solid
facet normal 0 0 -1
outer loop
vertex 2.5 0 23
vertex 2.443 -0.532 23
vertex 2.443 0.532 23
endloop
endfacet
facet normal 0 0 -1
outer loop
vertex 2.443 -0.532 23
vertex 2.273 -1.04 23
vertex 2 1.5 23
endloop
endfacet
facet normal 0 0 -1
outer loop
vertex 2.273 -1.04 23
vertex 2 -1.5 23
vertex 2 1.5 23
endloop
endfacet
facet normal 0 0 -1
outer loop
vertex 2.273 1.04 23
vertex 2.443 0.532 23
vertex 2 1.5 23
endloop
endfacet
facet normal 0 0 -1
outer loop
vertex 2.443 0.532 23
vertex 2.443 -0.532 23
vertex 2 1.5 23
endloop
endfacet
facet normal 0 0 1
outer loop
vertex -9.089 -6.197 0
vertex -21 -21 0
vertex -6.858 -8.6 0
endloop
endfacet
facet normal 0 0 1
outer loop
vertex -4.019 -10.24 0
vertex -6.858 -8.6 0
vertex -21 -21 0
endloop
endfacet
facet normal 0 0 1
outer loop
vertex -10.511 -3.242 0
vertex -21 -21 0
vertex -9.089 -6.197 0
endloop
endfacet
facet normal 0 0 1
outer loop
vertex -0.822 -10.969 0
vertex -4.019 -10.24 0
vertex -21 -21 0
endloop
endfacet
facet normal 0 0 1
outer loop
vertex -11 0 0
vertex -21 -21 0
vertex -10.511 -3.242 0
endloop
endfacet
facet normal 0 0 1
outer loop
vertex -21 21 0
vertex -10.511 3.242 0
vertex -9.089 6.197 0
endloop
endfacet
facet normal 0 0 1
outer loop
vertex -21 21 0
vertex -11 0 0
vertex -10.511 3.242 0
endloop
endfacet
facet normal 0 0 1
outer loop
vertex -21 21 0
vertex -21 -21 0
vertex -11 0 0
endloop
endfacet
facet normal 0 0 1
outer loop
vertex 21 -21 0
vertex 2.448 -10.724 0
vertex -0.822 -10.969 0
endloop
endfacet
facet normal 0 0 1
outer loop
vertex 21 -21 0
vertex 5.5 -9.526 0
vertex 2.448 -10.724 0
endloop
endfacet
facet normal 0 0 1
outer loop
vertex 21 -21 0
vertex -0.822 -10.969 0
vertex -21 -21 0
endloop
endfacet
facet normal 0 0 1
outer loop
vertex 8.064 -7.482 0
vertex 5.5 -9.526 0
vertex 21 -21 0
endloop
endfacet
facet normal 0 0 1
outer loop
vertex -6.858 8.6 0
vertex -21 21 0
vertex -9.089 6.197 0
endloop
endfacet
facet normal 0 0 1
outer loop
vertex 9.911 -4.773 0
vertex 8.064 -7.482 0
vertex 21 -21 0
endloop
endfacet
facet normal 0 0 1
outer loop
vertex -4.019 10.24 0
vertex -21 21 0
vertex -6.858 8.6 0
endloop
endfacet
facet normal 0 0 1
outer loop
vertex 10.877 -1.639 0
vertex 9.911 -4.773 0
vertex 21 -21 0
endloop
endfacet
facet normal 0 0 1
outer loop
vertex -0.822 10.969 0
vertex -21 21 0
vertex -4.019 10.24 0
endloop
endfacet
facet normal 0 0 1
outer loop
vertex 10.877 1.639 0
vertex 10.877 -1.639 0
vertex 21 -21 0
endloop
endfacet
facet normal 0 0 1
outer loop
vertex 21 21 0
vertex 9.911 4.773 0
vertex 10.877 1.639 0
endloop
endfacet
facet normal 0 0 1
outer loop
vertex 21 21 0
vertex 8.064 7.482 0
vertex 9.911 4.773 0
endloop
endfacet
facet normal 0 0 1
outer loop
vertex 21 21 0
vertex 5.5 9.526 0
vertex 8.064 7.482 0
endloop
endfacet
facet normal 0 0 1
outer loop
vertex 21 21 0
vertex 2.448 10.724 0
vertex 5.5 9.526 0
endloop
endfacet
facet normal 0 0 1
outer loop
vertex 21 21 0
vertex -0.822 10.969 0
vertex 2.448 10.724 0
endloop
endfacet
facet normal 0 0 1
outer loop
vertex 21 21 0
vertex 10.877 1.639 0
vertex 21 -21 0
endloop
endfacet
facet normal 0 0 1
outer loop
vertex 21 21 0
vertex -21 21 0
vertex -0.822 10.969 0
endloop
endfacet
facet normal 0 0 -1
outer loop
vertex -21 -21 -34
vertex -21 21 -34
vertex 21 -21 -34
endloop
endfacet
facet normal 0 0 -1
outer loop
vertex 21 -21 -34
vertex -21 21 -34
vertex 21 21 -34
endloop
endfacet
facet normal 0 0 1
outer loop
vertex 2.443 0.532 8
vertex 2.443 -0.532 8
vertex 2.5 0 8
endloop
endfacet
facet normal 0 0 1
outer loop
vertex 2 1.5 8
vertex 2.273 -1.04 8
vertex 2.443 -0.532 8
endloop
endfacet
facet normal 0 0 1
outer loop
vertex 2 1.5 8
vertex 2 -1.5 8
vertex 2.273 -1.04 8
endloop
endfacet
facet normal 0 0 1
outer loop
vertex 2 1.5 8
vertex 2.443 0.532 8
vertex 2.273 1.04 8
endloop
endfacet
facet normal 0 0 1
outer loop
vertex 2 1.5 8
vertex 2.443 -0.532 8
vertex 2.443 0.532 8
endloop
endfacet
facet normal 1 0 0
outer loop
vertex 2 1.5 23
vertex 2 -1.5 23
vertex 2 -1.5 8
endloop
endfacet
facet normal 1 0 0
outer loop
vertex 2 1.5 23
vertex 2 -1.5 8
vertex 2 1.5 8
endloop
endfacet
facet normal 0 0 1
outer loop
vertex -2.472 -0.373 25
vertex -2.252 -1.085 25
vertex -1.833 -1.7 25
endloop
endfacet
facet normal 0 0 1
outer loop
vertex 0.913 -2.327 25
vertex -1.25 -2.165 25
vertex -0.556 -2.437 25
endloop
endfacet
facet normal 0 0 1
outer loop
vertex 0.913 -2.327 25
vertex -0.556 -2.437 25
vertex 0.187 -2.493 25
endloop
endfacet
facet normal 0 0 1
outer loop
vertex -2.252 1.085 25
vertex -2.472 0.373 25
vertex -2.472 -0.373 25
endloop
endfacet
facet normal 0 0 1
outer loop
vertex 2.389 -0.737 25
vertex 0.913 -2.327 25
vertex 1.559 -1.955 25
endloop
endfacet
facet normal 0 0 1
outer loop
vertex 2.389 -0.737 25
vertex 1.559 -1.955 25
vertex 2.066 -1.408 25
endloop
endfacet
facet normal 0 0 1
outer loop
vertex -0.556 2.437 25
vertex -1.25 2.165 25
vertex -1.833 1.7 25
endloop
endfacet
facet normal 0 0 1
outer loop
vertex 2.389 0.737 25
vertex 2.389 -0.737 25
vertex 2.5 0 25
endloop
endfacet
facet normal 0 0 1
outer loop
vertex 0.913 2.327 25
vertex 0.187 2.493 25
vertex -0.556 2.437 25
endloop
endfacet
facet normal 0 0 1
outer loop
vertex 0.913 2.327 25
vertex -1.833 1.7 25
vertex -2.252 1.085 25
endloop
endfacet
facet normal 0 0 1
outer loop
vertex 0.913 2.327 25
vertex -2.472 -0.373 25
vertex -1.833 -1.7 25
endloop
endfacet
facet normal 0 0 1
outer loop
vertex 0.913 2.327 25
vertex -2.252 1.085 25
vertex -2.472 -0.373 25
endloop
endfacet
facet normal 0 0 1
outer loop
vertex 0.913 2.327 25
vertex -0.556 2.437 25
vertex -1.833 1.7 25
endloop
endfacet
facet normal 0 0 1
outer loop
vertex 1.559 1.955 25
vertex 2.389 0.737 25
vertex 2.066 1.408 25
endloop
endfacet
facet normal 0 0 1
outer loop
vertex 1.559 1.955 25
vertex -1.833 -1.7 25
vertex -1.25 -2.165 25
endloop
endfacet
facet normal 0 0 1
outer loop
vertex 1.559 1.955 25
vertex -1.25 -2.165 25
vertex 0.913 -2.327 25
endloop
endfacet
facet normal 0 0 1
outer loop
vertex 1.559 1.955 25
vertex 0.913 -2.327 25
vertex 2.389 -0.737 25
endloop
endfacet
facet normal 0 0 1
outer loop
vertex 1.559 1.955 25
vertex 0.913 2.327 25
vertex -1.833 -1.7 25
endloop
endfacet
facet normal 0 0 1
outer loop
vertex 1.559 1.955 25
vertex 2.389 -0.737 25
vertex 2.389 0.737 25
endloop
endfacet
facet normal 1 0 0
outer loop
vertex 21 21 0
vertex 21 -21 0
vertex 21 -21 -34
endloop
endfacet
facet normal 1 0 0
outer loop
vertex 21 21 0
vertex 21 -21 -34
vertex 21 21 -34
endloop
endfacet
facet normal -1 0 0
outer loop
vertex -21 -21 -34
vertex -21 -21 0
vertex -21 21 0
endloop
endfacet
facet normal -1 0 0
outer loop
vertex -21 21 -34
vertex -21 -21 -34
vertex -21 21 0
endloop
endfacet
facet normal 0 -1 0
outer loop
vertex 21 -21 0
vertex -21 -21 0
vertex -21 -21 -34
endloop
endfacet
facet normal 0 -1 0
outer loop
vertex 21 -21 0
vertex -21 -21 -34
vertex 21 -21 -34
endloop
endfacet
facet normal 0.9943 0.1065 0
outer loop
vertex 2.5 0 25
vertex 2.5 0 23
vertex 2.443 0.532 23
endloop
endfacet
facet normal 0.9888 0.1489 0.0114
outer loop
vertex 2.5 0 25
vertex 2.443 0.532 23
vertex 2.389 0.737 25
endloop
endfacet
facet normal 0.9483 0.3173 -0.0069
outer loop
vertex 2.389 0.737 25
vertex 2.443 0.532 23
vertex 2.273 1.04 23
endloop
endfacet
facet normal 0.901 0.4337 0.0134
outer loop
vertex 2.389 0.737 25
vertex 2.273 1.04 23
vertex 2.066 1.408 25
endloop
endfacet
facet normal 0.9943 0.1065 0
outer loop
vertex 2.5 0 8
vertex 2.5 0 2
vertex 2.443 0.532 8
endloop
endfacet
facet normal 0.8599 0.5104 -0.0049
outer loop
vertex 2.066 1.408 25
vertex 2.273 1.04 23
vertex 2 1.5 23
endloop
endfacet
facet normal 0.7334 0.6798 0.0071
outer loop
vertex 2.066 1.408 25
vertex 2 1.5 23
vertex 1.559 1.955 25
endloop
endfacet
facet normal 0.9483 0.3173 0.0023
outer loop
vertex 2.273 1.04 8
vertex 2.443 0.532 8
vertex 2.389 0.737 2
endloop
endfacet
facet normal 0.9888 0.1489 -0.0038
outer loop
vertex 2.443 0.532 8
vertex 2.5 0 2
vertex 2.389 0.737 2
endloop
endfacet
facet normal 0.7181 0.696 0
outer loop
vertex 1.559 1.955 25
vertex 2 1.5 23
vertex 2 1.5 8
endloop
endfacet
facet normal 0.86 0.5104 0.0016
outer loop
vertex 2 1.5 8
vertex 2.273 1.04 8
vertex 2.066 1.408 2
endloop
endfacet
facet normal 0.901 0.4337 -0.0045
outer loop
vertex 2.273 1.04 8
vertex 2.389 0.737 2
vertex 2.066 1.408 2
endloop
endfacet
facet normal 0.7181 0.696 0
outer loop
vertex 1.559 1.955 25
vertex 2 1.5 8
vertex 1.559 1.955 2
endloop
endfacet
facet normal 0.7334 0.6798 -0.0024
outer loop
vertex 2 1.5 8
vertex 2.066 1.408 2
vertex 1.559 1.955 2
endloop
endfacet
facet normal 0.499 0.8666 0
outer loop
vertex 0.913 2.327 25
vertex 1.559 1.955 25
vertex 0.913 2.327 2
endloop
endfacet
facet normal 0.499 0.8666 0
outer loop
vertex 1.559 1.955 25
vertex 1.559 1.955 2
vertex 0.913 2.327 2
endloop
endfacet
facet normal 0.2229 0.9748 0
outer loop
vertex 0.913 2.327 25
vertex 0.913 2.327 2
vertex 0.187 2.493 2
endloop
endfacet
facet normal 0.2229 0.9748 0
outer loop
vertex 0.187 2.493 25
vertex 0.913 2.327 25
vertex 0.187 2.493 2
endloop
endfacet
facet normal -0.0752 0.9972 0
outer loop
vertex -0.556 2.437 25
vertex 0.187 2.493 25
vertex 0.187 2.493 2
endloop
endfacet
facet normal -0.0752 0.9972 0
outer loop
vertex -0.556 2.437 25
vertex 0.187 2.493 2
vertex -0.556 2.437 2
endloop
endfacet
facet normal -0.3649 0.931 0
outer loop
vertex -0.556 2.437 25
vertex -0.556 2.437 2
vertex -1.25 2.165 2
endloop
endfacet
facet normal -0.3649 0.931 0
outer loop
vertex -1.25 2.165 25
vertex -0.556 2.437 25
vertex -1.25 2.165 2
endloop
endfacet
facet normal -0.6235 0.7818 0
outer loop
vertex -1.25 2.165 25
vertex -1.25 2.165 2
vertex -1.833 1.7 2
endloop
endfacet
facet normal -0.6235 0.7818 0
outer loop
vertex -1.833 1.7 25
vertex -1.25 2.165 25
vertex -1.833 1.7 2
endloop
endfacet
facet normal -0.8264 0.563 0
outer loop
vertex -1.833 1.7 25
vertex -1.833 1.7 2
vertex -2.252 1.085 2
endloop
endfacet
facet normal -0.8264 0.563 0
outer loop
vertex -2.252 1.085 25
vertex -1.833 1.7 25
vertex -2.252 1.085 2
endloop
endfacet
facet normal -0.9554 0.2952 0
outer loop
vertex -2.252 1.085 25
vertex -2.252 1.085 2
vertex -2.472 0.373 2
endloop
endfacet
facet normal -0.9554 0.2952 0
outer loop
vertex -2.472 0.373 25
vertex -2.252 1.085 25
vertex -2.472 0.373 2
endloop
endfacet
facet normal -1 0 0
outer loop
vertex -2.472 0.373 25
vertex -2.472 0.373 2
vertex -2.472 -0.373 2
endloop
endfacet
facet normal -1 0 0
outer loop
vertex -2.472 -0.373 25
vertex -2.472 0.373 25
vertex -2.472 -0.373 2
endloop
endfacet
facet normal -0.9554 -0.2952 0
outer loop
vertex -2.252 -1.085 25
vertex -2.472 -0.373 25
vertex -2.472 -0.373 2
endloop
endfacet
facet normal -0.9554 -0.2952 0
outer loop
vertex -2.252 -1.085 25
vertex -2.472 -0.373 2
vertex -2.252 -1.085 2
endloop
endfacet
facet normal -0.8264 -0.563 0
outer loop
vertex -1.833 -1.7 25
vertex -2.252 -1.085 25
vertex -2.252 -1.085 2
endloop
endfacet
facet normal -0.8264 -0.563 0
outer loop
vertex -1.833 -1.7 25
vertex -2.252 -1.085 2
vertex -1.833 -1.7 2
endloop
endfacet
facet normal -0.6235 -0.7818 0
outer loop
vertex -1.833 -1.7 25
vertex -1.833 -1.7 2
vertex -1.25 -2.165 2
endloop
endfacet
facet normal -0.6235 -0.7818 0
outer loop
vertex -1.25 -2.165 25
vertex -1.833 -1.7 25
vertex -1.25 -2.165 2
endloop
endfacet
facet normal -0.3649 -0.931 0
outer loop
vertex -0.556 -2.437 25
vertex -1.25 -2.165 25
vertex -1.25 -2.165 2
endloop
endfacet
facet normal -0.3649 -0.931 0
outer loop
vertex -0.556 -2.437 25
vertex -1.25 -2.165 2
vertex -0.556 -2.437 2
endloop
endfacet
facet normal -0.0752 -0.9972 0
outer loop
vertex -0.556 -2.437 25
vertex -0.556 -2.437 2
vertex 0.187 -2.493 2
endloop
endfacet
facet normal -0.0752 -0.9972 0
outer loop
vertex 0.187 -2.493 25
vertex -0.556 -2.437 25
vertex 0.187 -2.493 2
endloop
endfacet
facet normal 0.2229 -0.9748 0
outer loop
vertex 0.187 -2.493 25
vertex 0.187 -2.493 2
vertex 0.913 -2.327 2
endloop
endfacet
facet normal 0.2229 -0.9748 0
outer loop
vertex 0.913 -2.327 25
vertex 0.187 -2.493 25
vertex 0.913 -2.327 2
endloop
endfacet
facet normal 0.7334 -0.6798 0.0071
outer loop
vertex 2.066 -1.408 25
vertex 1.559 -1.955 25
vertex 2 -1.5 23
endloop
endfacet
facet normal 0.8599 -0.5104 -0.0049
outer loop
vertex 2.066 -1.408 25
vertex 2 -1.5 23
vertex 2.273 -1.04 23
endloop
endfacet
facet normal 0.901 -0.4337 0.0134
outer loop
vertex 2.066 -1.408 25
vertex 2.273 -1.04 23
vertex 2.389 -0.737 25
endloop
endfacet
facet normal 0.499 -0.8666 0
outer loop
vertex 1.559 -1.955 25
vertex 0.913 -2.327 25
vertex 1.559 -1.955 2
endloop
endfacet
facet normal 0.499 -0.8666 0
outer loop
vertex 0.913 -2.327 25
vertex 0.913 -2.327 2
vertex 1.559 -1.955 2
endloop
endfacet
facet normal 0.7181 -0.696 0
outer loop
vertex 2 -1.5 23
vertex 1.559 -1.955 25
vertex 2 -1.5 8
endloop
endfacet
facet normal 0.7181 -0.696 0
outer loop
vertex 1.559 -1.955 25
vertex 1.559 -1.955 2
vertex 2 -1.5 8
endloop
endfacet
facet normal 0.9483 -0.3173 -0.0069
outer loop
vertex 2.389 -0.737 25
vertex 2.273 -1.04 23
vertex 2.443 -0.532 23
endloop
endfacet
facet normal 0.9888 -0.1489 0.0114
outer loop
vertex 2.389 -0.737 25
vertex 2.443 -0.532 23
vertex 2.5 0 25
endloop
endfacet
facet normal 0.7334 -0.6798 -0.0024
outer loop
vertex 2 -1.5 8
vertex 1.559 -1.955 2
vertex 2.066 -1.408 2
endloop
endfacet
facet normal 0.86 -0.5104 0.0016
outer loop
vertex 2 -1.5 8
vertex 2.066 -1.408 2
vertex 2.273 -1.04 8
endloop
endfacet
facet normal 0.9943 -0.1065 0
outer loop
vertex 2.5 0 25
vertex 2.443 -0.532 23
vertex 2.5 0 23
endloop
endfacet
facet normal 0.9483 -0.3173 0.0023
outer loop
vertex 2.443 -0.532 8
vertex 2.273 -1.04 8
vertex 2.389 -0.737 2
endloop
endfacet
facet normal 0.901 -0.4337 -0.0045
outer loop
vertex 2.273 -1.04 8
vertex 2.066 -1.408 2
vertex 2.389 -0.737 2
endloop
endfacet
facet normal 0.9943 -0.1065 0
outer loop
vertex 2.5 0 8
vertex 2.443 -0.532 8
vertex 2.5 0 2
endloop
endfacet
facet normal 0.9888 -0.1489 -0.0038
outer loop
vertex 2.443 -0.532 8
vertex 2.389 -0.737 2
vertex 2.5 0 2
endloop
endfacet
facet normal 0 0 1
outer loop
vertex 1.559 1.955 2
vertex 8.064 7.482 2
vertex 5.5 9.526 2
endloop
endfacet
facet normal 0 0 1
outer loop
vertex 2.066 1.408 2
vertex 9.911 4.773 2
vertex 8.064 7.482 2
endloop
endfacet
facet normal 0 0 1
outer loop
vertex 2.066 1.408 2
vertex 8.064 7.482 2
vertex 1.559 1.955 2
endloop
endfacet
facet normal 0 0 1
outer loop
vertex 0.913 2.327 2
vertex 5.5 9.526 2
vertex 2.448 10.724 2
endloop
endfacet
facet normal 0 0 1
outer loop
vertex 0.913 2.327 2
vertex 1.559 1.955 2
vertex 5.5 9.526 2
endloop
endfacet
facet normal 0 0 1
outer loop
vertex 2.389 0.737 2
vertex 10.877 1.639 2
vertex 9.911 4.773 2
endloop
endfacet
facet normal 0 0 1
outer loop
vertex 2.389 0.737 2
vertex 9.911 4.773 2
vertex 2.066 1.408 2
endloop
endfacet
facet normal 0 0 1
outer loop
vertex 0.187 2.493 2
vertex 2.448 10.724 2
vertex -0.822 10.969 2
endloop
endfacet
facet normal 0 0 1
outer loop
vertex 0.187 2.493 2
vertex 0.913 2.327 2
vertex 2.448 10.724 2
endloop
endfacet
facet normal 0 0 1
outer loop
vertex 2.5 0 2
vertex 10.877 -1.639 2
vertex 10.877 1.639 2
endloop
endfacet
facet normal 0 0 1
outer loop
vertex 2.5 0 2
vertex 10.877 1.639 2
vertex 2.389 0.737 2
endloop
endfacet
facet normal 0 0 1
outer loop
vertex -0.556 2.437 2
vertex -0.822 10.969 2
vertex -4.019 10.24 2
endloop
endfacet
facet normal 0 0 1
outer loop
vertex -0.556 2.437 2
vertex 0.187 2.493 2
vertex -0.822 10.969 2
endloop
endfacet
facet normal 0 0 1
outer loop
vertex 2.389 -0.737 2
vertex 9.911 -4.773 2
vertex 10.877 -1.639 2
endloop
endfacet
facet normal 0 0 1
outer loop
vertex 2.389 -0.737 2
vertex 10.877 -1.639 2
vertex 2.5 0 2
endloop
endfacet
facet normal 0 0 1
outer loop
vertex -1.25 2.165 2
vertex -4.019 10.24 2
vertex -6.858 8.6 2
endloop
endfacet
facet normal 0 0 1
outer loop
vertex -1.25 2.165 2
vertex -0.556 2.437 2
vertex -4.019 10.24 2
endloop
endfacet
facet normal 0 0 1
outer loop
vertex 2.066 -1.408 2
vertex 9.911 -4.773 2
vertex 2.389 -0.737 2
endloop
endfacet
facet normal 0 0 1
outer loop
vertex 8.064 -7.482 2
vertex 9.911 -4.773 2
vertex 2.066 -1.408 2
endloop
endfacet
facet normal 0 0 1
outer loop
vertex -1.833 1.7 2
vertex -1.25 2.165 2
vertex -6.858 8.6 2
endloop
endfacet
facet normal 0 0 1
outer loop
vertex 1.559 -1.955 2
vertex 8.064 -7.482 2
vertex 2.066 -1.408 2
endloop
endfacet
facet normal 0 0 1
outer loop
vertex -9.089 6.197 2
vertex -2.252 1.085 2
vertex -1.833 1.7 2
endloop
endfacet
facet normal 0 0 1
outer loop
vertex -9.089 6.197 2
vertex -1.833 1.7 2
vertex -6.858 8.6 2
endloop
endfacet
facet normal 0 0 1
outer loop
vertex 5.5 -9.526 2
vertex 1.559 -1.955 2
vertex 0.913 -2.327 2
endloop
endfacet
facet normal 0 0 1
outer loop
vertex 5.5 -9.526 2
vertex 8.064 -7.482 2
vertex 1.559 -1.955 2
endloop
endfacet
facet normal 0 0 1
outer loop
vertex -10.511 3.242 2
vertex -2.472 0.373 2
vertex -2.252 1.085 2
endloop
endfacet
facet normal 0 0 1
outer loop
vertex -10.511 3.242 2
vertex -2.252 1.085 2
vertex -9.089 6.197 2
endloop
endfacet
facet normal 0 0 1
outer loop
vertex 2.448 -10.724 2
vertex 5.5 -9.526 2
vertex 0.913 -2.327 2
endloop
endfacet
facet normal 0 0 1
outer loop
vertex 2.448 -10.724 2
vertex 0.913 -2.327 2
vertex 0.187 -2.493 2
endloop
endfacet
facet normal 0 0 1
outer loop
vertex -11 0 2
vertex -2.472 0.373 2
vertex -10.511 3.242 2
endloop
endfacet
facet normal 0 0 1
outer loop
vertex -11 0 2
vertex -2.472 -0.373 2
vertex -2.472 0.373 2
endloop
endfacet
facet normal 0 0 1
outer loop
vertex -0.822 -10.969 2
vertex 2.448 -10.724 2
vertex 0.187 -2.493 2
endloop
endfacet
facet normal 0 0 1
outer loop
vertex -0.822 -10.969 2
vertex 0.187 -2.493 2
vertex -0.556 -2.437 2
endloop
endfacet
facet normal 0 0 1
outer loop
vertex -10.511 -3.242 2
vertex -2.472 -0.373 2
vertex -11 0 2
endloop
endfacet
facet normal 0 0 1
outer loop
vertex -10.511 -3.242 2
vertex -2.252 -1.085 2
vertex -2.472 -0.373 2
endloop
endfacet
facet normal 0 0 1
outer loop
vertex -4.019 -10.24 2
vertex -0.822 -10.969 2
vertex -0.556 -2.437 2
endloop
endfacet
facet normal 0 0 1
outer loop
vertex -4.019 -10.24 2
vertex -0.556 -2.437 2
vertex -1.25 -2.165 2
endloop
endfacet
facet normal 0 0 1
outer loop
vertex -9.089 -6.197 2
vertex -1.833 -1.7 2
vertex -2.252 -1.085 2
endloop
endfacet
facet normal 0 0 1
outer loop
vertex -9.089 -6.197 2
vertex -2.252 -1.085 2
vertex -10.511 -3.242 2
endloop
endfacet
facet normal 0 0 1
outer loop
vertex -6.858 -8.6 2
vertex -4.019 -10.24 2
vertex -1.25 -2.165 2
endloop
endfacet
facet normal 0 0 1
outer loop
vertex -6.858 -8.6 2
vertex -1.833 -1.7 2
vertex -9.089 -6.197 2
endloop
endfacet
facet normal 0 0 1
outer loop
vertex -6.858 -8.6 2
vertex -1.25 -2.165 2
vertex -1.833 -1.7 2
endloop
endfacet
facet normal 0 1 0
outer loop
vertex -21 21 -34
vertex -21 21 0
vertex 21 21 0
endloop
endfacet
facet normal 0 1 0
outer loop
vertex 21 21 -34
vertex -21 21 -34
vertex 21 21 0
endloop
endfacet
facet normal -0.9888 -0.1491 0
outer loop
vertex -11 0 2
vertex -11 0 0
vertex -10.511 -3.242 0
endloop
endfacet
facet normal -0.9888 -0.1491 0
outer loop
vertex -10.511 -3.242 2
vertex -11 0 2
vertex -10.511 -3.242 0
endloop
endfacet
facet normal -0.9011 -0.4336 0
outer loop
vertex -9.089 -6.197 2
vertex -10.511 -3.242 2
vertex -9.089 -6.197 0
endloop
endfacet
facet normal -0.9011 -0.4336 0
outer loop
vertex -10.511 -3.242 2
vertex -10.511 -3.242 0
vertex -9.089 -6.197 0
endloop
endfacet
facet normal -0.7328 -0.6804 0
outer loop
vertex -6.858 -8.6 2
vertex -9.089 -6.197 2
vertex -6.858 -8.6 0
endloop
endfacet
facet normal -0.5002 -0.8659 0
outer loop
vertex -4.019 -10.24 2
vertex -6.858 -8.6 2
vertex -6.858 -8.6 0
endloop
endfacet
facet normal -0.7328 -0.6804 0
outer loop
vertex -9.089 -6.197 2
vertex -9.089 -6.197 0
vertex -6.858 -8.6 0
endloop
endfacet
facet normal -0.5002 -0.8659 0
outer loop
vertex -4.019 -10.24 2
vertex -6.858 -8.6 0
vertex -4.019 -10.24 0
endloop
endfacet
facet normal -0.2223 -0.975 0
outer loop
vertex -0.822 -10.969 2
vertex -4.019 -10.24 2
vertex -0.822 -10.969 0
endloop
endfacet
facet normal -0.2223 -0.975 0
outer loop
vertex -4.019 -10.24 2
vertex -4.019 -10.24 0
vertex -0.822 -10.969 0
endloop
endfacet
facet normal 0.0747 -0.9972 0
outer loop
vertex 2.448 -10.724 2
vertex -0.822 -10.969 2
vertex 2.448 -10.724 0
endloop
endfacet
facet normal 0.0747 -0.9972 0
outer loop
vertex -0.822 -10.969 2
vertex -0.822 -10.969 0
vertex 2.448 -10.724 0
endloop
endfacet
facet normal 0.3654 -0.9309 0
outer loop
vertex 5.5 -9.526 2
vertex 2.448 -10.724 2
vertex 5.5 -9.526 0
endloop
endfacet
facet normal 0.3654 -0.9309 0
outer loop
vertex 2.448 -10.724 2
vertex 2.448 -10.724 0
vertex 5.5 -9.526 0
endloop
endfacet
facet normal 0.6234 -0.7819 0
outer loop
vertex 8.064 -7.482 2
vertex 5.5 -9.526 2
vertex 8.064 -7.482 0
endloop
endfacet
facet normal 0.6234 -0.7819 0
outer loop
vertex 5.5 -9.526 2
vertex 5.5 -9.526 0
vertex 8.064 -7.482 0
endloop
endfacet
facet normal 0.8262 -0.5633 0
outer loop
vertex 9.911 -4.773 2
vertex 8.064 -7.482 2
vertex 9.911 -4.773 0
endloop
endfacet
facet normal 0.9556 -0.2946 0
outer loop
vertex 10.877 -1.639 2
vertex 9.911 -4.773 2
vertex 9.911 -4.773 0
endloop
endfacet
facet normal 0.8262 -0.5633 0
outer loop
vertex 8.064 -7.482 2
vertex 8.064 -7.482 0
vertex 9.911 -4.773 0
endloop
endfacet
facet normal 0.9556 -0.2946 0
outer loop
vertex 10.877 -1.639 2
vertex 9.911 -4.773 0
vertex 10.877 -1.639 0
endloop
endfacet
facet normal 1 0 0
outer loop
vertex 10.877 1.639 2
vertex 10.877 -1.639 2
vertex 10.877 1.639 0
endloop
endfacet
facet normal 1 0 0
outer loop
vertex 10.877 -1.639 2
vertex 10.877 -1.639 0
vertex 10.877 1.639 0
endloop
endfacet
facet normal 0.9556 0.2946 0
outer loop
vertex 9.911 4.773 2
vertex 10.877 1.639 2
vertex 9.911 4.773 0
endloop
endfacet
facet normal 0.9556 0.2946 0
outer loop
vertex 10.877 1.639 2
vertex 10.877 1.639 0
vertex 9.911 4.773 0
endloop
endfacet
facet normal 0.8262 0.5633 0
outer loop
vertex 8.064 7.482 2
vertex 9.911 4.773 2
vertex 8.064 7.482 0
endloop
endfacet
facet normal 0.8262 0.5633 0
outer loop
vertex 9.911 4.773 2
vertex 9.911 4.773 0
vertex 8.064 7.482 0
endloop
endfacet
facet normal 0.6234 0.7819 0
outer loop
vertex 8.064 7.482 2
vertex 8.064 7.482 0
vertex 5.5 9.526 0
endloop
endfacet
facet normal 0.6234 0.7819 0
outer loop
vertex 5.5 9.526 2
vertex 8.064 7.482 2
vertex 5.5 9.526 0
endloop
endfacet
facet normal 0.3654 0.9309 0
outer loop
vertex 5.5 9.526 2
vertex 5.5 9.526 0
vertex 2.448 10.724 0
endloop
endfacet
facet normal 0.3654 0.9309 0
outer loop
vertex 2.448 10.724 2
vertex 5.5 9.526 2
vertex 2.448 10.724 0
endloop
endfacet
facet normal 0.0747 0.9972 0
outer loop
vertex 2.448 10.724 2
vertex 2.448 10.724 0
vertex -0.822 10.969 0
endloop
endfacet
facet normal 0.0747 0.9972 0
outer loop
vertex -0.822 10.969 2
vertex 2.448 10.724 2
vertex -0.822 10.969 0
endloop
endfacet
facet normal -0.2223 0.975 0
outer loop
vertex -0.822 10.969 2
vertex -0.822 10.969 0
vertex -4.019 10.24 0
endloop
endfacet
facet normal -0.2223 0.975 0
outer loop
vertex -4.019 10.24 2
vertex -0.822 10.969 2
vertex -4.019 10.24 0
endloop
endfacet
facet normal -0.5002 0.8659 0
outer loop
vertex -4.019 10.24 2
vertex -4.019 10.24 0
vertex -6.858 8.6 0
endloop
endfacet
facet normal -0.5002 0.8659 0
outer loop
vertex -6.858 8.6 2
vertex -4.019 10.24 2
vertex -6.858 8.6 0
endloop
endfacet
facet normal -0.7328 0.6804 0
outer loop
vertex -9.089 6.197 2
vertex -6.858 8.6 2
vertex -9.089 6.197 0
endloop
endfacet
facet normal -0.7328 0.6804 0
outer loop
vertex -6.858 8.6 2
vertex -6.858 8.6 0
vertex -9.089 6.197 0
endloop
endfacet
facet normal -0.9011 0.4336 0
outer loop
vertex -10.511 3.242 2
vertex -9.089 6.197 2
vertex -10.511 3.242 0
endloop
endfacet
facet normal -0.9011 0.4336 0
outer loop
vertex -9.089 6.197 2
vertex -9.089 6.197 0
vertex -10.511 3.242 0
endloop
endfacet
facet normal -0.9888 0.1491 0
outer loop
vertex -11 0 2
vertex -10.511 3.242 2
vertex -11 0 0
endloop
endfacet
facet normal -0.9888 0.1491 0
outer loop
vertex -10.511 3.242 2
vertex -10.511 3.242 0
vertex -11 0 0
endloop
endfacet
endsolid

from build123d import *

# Parameters (mm, degrees)
SKETCH1_W           = 42
SKETCH1_H           = 42
BOSS_EXTRUDE1_DEPTH = 34
SKETCH2_R           = 2.5
BOSS_EXTRUDE2_DEPTH = 25
SKETCH3_R           = 11
BOSS_EXTRUDE3_DEPTH = 2
SKETCH4_W           = 1
SKETCH4_H           = 6
CUT_EXTRUDE1_DEPTH  = 15


with BuildPart() as part:
    # Sketch1 → Boss-Extrude1 (new body)
    with BuildSketch(Plane.XY):
        Rectangle(SKETCH1_W, SKETCH1_H)
    extrude(amount=-BOSS_EXTRUDE1_DEPTH)

    # Sketch2 → Boss-Extrude2 (add)
    with BuildSketch(Plane.XY):
        Circle(SKETCH2_R)
    extrude(amount=BOSS_EXTRUDE2_DEPTH)

    # Sketch3 → Boss-Extrude3 (add)
    with BuildSketch(Plane.XY):
        with Locations(Location((0, 0, 0), (0, 0, 180))):
            Circle(SKETCH3_R)
    extrude(amount=BOSS_EXTRUDE3_DEPTH)

    # Sketch4 → Cut-Extrude1 (cut)
    with BuildSketch(Plane.XY.offset(23)):
        with Locations((2.5, 0)):
            Rectangle(SKETCH4_W, SKETCH4_H)
    extrude(amount=-CUT_EXTRUDE1_DEPTH, mode=Mode.SUBTRACT)


solid = part.part
